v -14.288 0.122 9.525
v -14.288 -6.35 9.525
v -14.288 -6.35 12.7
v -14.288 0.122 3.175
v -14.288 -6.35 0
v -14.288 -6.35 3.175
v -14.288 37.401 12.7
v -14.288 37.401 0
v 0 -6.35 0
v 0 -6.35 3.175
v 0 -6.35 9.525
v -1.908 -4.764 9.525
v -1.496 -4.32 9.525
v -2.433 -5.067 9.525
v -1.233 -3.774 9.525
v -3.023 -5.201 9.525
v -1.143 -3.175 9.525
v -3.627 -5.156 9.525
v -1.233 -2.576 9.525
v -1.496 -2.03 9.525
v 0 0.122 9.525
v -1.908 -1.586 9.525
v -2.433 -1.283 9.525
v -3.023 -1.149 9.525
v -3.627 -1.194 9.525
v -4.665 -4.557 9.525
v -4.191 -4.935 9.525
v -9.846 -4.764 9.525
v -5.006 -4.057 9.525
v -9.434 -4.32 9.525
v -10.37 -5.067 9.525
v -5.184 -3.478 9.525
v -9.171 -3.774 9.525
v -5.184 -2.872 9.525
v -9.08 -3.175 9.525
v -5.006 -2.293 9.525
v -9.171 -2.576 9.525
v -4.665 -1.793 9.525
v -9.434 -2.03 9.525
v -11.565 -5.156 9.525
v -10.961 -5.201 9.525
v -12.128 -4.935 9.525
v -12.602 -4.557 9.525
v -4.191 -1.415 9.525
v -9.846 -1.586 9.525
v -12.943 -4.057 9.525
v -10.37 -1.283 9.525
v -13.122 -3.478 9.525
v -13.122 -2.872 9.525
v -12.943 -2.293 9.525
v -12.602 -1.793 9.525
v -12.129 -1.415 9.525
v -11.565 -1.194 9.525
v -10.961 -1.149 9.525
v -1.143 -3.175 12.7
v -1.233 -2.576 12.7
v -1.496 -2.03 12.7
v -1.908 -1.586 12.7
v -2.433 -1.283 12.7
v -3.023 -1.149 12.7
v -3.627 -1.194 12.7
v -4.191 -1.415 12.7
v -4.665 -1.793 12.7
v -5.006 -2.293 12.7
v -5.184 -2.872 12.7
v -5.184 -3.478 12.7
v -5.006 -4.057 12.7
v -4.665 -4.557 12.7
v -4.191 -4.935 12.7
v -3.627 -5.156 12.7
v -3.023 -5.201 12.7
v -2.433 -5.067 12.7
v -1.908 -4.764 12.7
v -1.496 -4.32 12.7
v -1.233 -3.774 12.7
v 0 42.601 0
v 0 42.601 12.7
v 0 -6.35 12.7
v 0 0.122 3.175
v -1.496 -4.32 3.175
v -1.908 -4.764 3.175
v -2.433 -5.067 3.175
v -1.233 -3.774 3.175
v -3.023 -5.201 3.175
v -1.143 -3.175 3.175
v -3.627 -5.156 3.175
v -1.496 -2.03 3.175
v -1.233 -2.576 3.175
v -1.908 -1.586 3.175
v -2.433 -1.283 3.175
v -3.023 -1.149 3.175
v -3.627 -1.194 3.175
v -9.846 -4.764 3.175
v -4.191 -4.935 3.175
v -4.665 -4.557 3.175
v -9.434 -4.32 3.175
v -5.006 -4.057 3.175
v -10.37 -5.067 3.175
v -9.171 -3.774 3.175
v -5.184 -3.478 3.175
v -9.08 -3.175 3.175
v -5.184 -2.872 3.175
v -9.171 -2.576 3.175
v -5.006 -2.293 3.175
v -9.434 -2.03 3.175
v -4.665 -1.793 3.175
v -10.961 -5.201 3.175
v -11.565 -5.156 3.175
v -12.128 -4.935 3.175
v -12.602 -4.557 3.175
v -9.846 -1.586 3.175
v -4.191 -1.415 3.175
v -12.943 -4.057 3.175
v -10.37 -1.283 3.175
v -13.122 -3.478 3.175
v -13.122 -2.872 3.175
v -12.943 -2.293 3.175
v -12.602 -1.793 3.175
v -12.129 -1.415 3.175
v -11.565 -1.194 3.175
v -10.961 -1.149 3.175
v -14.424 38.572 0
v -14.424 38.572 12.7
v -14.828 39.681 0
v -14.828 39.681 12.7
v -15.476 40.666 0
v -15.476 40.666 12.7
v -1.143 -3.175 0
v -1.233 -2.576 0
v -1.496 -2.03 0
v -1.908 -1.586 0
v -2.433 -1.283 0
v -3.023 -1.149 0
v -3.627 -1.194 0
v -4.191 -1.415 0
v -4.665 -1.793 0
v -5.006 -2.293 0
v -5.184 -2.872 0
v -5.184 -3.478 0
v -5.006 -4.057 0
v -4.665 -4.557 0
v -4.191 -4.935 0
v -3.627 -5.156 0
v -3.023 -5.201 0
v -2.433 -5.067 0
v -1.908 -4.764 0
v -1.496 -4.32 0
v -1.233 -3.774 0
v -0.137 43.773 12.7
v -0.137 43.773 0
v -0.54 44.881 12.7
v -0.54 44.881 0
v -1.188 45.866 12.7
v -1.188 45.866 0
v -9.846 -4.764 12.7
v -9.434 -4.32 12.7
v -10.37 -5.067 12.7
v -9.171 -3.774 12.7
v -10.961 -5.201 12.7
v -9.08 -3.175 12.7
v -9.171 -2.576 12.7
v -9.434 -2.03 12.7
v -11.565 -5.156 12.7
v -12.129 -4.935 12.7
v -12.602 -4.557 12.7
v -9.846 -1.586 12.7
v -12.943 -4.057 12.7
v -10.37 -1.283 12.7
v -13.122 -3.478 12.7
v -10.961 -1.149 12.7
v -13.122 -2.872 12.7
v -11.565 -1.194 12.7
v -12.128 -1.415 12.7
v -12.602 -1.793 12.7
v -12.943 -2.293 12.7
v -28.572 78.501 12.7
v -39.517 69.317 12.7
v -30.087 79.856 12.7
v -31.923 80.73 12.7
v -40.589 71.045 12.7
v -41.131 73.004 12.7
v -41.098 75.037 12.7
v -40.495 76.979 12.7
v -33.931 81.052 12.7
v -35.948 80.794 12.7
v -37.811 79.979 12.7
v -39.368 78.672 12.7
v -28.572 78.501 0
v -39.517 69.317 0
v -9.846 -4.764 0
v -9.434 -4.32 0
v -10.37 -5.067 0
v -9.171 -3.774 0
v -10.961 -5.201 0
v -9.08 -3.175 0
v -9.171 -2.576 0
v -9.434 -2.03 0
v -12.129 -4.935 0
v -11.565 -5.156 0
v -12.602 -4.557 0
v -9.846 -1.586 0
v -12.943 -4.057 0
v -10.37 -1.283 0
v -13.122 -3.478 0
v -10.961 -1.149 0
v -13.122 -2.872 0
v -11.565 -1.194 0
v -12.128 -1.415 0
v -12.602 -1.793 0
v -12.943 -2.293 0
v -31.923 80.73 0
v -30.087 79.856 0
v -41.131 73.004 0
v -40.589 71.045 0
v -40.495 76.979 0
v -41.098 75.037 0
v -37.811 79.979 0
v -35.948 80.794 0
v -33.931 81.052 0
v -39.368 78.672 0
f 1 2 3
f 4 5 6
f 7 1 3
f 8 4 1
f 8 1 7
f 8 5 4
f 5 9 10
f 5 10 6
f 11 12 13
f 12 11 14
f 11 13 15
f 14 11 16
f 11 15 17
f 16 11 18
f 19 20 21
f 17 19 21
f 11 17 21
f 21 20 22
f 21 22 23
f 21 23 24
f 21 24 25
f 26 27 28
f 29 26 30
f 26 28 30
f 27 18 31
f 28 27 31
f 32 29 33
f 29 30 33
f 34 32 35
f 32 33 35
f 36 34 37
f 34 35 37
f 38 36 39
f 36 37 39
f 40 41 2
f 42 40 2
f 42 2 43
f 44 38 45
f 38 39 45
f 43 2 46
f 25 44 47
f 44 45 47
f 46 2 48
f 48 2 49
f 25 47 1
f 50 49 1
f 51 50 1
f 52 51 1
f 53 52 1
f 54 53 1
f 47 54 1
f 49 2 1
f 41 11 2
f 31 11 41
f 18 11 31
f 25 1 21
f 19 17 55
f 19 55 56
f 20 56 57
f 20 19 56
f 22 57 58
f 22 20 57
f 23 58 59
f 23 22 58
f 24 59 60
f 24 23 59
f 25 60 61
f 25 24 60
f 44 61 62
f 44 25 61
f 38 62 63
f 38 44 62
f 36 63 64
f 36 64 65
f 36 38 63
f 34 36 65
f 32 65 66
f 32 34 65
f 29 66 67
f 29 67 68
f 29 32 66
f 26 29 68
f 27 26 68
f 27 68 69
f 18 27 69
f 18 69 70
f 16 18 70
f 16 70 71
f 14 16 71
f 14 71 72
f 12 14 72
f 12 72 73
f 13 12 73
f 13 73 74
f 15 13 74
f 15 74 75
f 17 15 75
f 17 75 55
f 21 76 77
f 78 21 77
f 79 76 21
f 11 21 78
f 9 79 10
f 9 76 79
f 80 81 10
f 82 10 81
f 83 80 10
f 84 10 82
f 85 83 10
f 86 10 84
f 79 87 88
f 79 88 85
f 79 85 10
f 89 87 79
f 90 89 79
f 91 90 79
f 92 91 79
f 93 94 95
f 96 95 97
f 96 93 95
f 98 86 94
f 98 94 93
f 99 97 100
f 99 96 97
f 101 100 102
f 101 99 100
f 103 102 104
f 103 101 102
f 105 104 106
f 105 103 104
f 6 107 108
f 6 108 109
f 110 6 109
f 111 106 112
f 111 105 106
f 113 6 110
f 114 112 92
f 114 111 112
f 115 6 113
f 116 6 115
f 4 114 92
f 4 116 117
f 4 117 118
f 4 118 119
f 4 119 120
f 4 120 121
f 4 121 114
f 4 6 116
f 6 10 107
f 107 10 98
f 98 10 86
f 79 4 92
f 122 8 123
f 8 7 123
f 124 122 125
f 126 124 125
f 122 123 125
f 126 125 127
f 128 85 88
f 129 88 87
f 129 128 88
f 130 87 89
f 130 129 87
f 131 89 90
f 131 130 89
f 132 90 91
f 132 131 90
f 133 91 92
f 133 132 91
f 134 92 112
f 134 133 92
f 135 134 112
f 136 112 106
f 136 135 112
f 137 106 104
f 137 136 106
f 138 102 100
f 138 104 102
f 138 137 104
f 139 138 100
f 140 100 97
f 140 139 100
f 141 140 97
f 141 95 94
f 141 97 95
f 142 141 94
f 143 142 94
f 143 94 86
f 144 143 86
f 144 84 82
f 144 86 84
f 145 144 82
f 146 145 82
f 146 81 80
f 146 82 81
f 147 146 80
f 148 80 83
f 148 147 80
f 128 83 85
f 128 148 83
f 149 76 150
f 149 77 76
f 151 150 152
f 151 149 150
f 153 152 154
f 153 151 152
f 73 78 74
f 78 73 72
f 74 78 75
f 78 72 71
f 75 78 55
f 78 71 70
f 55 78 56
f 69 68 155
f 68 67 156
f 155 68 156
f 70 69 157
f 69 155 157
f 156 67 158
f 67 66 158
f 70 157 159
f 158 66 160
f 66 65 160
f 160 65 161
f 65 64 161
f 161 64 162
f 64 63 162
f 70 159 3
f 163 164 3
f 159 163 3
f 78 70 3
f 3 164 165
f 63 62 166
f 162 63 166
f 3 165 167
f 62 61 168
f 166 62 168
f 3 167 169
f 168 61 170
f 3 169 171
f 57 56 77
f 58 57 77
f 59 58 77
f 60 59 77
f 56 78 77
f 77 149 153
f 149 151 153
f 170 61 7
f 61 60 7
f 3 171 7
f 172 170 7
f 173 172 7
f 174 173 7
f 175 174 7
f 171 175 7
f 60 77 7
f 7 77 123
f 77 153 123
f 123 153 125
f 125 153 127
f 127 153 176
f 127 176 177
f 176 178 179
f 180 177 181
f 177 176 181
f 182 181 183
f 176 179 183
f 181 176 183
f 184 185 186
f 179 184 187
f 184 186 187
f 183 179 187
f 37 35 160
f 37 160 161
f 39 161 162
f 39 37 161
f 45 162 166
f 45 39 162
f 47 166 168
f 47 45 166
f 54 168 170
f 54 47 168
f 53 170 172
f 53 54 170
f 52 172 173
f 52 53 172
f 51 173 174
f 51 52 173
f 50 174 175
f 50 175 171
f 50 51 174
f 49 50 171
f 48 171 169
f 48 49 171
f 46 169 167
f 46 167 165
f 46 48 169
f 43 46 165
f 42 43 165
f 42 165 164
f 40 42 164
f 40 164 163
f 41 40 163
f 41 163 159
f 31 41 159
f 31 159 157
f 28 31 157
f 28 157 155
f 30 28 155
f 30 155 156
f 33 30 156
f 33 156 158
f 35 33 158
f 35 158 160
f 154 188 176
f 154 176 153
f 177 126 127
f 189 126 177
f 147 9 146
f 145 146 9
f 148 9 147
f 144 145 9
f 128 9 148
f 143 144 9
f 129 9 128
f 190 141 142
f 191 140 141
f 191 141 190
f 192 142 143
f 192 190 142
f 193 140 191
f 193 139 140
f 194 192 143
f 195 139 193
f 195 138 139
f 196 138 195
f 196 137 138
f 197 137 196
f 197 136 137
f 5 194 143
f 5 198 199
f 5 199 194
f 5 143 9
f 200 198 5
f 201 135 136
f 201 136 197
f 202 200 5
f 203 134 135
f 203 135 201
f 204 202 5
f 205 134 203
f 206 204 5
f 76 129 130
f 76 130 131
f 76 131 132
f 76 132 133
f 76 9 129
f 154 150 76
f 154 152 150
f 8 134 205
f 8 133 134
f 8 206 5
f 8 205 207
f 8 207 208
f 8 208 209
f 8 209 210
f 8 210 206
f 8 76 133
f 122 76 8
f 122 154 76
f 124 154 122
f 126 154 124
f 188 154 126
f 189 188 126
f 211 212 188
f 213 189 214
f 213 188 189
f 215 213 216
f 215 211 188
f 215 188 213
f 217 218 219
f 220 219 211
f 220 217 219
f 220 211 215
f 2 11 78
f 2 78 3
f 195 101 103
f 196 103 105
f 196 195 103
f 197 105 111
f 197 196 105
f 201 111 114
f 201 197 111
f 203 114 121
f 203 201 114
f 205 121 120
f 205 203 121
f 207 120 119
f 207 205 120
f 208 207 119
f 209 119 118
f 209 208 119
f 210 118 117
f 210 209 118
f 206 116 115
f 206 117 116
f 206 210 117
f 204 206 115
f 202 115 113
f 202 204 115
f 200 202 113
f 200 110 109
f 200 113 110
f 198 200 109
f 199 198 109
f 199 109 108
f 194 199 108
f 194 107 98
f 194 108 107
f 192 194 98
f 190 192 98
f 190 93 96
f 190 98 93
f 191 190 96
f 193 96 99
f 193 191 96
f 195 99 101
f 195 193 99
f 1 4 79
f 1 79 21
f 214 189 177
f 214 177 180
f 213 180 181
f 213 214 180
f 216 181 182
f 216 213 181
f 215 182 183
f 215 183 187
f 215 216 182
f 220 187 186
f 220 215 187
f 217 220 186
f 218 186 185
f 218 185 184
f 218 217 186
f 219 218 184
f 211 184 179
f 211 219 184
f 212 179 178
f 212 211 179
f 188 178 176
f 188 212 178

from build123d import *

# Parameters (mm, degrees)
SKETCH4_R           = 2.032
BOSS_EXTRUDE1_DEPTH = 12.7
SKETCH5_W           = 6.35
SKETCH5_H           = 6.47192
CUT_EXTRUDE1_DEPTH  = 15.2875
FILLET1_R           = 5.08


with BuildPart() as part:
    # Sketch4 → Boss-Extrude1 (new body)
    with BuildSketch(Plane.XY):
        with BuildLine():
            Line((0, -6.35), (-14.2875, -6.35))
            Line((-14.2875, -6.35), (-14.2875, 0))
            Line((-14.2875, 0), (-14.2875, 39.249775278))
            Line((-14.2875, 39.249775278), (-39.516769232, 69.316847523))
            ThreePointArc((-39.516769232, 69.316847523), (-38.636253228, 79.3811915), (-28.571909251, 78.500675497))
            Line((-28.571909251, 78.500675497), (0, 44.45))
            Line((0, 44.45), (0, 0))
            Line((0, 0), (0, -6.35))
        make_face()
        with Locations((-11.1125, -3.175)):
            Circle(SKETCH4_R, mode=Mode.SUBTRACT)
        with Locations((-3.175, -3.175)):
            Circle(SKETCH4_R, mode=Mode.SUBTRACT)
    extrude(amount=BOSS_EXTRUDE1_DEPTH)

    # Sketch5 → Cut-Extrude1 (cut, through all)
    with BuildSketch(Plane.ZY.offset(14.2875)):
        with Locations((6.35, -3.11404)):
            Rectangle(SKETCH5_W, SKETCH5_H)
    extrude(amount=-CUT_EXTRUDE1_DEPTH, mode=Mode.SUBTRACT)

    # Fillet1
    fillet1_edges = [part.edges().sort_by_distance(p)[0] for p in [
        (0, 44.45, 6.35),
        (-14.2875, 39.249775278, 6.35),
    ]]
    fillet(fillet1_edges, radius=FILLET1_R)


solid = part.part
